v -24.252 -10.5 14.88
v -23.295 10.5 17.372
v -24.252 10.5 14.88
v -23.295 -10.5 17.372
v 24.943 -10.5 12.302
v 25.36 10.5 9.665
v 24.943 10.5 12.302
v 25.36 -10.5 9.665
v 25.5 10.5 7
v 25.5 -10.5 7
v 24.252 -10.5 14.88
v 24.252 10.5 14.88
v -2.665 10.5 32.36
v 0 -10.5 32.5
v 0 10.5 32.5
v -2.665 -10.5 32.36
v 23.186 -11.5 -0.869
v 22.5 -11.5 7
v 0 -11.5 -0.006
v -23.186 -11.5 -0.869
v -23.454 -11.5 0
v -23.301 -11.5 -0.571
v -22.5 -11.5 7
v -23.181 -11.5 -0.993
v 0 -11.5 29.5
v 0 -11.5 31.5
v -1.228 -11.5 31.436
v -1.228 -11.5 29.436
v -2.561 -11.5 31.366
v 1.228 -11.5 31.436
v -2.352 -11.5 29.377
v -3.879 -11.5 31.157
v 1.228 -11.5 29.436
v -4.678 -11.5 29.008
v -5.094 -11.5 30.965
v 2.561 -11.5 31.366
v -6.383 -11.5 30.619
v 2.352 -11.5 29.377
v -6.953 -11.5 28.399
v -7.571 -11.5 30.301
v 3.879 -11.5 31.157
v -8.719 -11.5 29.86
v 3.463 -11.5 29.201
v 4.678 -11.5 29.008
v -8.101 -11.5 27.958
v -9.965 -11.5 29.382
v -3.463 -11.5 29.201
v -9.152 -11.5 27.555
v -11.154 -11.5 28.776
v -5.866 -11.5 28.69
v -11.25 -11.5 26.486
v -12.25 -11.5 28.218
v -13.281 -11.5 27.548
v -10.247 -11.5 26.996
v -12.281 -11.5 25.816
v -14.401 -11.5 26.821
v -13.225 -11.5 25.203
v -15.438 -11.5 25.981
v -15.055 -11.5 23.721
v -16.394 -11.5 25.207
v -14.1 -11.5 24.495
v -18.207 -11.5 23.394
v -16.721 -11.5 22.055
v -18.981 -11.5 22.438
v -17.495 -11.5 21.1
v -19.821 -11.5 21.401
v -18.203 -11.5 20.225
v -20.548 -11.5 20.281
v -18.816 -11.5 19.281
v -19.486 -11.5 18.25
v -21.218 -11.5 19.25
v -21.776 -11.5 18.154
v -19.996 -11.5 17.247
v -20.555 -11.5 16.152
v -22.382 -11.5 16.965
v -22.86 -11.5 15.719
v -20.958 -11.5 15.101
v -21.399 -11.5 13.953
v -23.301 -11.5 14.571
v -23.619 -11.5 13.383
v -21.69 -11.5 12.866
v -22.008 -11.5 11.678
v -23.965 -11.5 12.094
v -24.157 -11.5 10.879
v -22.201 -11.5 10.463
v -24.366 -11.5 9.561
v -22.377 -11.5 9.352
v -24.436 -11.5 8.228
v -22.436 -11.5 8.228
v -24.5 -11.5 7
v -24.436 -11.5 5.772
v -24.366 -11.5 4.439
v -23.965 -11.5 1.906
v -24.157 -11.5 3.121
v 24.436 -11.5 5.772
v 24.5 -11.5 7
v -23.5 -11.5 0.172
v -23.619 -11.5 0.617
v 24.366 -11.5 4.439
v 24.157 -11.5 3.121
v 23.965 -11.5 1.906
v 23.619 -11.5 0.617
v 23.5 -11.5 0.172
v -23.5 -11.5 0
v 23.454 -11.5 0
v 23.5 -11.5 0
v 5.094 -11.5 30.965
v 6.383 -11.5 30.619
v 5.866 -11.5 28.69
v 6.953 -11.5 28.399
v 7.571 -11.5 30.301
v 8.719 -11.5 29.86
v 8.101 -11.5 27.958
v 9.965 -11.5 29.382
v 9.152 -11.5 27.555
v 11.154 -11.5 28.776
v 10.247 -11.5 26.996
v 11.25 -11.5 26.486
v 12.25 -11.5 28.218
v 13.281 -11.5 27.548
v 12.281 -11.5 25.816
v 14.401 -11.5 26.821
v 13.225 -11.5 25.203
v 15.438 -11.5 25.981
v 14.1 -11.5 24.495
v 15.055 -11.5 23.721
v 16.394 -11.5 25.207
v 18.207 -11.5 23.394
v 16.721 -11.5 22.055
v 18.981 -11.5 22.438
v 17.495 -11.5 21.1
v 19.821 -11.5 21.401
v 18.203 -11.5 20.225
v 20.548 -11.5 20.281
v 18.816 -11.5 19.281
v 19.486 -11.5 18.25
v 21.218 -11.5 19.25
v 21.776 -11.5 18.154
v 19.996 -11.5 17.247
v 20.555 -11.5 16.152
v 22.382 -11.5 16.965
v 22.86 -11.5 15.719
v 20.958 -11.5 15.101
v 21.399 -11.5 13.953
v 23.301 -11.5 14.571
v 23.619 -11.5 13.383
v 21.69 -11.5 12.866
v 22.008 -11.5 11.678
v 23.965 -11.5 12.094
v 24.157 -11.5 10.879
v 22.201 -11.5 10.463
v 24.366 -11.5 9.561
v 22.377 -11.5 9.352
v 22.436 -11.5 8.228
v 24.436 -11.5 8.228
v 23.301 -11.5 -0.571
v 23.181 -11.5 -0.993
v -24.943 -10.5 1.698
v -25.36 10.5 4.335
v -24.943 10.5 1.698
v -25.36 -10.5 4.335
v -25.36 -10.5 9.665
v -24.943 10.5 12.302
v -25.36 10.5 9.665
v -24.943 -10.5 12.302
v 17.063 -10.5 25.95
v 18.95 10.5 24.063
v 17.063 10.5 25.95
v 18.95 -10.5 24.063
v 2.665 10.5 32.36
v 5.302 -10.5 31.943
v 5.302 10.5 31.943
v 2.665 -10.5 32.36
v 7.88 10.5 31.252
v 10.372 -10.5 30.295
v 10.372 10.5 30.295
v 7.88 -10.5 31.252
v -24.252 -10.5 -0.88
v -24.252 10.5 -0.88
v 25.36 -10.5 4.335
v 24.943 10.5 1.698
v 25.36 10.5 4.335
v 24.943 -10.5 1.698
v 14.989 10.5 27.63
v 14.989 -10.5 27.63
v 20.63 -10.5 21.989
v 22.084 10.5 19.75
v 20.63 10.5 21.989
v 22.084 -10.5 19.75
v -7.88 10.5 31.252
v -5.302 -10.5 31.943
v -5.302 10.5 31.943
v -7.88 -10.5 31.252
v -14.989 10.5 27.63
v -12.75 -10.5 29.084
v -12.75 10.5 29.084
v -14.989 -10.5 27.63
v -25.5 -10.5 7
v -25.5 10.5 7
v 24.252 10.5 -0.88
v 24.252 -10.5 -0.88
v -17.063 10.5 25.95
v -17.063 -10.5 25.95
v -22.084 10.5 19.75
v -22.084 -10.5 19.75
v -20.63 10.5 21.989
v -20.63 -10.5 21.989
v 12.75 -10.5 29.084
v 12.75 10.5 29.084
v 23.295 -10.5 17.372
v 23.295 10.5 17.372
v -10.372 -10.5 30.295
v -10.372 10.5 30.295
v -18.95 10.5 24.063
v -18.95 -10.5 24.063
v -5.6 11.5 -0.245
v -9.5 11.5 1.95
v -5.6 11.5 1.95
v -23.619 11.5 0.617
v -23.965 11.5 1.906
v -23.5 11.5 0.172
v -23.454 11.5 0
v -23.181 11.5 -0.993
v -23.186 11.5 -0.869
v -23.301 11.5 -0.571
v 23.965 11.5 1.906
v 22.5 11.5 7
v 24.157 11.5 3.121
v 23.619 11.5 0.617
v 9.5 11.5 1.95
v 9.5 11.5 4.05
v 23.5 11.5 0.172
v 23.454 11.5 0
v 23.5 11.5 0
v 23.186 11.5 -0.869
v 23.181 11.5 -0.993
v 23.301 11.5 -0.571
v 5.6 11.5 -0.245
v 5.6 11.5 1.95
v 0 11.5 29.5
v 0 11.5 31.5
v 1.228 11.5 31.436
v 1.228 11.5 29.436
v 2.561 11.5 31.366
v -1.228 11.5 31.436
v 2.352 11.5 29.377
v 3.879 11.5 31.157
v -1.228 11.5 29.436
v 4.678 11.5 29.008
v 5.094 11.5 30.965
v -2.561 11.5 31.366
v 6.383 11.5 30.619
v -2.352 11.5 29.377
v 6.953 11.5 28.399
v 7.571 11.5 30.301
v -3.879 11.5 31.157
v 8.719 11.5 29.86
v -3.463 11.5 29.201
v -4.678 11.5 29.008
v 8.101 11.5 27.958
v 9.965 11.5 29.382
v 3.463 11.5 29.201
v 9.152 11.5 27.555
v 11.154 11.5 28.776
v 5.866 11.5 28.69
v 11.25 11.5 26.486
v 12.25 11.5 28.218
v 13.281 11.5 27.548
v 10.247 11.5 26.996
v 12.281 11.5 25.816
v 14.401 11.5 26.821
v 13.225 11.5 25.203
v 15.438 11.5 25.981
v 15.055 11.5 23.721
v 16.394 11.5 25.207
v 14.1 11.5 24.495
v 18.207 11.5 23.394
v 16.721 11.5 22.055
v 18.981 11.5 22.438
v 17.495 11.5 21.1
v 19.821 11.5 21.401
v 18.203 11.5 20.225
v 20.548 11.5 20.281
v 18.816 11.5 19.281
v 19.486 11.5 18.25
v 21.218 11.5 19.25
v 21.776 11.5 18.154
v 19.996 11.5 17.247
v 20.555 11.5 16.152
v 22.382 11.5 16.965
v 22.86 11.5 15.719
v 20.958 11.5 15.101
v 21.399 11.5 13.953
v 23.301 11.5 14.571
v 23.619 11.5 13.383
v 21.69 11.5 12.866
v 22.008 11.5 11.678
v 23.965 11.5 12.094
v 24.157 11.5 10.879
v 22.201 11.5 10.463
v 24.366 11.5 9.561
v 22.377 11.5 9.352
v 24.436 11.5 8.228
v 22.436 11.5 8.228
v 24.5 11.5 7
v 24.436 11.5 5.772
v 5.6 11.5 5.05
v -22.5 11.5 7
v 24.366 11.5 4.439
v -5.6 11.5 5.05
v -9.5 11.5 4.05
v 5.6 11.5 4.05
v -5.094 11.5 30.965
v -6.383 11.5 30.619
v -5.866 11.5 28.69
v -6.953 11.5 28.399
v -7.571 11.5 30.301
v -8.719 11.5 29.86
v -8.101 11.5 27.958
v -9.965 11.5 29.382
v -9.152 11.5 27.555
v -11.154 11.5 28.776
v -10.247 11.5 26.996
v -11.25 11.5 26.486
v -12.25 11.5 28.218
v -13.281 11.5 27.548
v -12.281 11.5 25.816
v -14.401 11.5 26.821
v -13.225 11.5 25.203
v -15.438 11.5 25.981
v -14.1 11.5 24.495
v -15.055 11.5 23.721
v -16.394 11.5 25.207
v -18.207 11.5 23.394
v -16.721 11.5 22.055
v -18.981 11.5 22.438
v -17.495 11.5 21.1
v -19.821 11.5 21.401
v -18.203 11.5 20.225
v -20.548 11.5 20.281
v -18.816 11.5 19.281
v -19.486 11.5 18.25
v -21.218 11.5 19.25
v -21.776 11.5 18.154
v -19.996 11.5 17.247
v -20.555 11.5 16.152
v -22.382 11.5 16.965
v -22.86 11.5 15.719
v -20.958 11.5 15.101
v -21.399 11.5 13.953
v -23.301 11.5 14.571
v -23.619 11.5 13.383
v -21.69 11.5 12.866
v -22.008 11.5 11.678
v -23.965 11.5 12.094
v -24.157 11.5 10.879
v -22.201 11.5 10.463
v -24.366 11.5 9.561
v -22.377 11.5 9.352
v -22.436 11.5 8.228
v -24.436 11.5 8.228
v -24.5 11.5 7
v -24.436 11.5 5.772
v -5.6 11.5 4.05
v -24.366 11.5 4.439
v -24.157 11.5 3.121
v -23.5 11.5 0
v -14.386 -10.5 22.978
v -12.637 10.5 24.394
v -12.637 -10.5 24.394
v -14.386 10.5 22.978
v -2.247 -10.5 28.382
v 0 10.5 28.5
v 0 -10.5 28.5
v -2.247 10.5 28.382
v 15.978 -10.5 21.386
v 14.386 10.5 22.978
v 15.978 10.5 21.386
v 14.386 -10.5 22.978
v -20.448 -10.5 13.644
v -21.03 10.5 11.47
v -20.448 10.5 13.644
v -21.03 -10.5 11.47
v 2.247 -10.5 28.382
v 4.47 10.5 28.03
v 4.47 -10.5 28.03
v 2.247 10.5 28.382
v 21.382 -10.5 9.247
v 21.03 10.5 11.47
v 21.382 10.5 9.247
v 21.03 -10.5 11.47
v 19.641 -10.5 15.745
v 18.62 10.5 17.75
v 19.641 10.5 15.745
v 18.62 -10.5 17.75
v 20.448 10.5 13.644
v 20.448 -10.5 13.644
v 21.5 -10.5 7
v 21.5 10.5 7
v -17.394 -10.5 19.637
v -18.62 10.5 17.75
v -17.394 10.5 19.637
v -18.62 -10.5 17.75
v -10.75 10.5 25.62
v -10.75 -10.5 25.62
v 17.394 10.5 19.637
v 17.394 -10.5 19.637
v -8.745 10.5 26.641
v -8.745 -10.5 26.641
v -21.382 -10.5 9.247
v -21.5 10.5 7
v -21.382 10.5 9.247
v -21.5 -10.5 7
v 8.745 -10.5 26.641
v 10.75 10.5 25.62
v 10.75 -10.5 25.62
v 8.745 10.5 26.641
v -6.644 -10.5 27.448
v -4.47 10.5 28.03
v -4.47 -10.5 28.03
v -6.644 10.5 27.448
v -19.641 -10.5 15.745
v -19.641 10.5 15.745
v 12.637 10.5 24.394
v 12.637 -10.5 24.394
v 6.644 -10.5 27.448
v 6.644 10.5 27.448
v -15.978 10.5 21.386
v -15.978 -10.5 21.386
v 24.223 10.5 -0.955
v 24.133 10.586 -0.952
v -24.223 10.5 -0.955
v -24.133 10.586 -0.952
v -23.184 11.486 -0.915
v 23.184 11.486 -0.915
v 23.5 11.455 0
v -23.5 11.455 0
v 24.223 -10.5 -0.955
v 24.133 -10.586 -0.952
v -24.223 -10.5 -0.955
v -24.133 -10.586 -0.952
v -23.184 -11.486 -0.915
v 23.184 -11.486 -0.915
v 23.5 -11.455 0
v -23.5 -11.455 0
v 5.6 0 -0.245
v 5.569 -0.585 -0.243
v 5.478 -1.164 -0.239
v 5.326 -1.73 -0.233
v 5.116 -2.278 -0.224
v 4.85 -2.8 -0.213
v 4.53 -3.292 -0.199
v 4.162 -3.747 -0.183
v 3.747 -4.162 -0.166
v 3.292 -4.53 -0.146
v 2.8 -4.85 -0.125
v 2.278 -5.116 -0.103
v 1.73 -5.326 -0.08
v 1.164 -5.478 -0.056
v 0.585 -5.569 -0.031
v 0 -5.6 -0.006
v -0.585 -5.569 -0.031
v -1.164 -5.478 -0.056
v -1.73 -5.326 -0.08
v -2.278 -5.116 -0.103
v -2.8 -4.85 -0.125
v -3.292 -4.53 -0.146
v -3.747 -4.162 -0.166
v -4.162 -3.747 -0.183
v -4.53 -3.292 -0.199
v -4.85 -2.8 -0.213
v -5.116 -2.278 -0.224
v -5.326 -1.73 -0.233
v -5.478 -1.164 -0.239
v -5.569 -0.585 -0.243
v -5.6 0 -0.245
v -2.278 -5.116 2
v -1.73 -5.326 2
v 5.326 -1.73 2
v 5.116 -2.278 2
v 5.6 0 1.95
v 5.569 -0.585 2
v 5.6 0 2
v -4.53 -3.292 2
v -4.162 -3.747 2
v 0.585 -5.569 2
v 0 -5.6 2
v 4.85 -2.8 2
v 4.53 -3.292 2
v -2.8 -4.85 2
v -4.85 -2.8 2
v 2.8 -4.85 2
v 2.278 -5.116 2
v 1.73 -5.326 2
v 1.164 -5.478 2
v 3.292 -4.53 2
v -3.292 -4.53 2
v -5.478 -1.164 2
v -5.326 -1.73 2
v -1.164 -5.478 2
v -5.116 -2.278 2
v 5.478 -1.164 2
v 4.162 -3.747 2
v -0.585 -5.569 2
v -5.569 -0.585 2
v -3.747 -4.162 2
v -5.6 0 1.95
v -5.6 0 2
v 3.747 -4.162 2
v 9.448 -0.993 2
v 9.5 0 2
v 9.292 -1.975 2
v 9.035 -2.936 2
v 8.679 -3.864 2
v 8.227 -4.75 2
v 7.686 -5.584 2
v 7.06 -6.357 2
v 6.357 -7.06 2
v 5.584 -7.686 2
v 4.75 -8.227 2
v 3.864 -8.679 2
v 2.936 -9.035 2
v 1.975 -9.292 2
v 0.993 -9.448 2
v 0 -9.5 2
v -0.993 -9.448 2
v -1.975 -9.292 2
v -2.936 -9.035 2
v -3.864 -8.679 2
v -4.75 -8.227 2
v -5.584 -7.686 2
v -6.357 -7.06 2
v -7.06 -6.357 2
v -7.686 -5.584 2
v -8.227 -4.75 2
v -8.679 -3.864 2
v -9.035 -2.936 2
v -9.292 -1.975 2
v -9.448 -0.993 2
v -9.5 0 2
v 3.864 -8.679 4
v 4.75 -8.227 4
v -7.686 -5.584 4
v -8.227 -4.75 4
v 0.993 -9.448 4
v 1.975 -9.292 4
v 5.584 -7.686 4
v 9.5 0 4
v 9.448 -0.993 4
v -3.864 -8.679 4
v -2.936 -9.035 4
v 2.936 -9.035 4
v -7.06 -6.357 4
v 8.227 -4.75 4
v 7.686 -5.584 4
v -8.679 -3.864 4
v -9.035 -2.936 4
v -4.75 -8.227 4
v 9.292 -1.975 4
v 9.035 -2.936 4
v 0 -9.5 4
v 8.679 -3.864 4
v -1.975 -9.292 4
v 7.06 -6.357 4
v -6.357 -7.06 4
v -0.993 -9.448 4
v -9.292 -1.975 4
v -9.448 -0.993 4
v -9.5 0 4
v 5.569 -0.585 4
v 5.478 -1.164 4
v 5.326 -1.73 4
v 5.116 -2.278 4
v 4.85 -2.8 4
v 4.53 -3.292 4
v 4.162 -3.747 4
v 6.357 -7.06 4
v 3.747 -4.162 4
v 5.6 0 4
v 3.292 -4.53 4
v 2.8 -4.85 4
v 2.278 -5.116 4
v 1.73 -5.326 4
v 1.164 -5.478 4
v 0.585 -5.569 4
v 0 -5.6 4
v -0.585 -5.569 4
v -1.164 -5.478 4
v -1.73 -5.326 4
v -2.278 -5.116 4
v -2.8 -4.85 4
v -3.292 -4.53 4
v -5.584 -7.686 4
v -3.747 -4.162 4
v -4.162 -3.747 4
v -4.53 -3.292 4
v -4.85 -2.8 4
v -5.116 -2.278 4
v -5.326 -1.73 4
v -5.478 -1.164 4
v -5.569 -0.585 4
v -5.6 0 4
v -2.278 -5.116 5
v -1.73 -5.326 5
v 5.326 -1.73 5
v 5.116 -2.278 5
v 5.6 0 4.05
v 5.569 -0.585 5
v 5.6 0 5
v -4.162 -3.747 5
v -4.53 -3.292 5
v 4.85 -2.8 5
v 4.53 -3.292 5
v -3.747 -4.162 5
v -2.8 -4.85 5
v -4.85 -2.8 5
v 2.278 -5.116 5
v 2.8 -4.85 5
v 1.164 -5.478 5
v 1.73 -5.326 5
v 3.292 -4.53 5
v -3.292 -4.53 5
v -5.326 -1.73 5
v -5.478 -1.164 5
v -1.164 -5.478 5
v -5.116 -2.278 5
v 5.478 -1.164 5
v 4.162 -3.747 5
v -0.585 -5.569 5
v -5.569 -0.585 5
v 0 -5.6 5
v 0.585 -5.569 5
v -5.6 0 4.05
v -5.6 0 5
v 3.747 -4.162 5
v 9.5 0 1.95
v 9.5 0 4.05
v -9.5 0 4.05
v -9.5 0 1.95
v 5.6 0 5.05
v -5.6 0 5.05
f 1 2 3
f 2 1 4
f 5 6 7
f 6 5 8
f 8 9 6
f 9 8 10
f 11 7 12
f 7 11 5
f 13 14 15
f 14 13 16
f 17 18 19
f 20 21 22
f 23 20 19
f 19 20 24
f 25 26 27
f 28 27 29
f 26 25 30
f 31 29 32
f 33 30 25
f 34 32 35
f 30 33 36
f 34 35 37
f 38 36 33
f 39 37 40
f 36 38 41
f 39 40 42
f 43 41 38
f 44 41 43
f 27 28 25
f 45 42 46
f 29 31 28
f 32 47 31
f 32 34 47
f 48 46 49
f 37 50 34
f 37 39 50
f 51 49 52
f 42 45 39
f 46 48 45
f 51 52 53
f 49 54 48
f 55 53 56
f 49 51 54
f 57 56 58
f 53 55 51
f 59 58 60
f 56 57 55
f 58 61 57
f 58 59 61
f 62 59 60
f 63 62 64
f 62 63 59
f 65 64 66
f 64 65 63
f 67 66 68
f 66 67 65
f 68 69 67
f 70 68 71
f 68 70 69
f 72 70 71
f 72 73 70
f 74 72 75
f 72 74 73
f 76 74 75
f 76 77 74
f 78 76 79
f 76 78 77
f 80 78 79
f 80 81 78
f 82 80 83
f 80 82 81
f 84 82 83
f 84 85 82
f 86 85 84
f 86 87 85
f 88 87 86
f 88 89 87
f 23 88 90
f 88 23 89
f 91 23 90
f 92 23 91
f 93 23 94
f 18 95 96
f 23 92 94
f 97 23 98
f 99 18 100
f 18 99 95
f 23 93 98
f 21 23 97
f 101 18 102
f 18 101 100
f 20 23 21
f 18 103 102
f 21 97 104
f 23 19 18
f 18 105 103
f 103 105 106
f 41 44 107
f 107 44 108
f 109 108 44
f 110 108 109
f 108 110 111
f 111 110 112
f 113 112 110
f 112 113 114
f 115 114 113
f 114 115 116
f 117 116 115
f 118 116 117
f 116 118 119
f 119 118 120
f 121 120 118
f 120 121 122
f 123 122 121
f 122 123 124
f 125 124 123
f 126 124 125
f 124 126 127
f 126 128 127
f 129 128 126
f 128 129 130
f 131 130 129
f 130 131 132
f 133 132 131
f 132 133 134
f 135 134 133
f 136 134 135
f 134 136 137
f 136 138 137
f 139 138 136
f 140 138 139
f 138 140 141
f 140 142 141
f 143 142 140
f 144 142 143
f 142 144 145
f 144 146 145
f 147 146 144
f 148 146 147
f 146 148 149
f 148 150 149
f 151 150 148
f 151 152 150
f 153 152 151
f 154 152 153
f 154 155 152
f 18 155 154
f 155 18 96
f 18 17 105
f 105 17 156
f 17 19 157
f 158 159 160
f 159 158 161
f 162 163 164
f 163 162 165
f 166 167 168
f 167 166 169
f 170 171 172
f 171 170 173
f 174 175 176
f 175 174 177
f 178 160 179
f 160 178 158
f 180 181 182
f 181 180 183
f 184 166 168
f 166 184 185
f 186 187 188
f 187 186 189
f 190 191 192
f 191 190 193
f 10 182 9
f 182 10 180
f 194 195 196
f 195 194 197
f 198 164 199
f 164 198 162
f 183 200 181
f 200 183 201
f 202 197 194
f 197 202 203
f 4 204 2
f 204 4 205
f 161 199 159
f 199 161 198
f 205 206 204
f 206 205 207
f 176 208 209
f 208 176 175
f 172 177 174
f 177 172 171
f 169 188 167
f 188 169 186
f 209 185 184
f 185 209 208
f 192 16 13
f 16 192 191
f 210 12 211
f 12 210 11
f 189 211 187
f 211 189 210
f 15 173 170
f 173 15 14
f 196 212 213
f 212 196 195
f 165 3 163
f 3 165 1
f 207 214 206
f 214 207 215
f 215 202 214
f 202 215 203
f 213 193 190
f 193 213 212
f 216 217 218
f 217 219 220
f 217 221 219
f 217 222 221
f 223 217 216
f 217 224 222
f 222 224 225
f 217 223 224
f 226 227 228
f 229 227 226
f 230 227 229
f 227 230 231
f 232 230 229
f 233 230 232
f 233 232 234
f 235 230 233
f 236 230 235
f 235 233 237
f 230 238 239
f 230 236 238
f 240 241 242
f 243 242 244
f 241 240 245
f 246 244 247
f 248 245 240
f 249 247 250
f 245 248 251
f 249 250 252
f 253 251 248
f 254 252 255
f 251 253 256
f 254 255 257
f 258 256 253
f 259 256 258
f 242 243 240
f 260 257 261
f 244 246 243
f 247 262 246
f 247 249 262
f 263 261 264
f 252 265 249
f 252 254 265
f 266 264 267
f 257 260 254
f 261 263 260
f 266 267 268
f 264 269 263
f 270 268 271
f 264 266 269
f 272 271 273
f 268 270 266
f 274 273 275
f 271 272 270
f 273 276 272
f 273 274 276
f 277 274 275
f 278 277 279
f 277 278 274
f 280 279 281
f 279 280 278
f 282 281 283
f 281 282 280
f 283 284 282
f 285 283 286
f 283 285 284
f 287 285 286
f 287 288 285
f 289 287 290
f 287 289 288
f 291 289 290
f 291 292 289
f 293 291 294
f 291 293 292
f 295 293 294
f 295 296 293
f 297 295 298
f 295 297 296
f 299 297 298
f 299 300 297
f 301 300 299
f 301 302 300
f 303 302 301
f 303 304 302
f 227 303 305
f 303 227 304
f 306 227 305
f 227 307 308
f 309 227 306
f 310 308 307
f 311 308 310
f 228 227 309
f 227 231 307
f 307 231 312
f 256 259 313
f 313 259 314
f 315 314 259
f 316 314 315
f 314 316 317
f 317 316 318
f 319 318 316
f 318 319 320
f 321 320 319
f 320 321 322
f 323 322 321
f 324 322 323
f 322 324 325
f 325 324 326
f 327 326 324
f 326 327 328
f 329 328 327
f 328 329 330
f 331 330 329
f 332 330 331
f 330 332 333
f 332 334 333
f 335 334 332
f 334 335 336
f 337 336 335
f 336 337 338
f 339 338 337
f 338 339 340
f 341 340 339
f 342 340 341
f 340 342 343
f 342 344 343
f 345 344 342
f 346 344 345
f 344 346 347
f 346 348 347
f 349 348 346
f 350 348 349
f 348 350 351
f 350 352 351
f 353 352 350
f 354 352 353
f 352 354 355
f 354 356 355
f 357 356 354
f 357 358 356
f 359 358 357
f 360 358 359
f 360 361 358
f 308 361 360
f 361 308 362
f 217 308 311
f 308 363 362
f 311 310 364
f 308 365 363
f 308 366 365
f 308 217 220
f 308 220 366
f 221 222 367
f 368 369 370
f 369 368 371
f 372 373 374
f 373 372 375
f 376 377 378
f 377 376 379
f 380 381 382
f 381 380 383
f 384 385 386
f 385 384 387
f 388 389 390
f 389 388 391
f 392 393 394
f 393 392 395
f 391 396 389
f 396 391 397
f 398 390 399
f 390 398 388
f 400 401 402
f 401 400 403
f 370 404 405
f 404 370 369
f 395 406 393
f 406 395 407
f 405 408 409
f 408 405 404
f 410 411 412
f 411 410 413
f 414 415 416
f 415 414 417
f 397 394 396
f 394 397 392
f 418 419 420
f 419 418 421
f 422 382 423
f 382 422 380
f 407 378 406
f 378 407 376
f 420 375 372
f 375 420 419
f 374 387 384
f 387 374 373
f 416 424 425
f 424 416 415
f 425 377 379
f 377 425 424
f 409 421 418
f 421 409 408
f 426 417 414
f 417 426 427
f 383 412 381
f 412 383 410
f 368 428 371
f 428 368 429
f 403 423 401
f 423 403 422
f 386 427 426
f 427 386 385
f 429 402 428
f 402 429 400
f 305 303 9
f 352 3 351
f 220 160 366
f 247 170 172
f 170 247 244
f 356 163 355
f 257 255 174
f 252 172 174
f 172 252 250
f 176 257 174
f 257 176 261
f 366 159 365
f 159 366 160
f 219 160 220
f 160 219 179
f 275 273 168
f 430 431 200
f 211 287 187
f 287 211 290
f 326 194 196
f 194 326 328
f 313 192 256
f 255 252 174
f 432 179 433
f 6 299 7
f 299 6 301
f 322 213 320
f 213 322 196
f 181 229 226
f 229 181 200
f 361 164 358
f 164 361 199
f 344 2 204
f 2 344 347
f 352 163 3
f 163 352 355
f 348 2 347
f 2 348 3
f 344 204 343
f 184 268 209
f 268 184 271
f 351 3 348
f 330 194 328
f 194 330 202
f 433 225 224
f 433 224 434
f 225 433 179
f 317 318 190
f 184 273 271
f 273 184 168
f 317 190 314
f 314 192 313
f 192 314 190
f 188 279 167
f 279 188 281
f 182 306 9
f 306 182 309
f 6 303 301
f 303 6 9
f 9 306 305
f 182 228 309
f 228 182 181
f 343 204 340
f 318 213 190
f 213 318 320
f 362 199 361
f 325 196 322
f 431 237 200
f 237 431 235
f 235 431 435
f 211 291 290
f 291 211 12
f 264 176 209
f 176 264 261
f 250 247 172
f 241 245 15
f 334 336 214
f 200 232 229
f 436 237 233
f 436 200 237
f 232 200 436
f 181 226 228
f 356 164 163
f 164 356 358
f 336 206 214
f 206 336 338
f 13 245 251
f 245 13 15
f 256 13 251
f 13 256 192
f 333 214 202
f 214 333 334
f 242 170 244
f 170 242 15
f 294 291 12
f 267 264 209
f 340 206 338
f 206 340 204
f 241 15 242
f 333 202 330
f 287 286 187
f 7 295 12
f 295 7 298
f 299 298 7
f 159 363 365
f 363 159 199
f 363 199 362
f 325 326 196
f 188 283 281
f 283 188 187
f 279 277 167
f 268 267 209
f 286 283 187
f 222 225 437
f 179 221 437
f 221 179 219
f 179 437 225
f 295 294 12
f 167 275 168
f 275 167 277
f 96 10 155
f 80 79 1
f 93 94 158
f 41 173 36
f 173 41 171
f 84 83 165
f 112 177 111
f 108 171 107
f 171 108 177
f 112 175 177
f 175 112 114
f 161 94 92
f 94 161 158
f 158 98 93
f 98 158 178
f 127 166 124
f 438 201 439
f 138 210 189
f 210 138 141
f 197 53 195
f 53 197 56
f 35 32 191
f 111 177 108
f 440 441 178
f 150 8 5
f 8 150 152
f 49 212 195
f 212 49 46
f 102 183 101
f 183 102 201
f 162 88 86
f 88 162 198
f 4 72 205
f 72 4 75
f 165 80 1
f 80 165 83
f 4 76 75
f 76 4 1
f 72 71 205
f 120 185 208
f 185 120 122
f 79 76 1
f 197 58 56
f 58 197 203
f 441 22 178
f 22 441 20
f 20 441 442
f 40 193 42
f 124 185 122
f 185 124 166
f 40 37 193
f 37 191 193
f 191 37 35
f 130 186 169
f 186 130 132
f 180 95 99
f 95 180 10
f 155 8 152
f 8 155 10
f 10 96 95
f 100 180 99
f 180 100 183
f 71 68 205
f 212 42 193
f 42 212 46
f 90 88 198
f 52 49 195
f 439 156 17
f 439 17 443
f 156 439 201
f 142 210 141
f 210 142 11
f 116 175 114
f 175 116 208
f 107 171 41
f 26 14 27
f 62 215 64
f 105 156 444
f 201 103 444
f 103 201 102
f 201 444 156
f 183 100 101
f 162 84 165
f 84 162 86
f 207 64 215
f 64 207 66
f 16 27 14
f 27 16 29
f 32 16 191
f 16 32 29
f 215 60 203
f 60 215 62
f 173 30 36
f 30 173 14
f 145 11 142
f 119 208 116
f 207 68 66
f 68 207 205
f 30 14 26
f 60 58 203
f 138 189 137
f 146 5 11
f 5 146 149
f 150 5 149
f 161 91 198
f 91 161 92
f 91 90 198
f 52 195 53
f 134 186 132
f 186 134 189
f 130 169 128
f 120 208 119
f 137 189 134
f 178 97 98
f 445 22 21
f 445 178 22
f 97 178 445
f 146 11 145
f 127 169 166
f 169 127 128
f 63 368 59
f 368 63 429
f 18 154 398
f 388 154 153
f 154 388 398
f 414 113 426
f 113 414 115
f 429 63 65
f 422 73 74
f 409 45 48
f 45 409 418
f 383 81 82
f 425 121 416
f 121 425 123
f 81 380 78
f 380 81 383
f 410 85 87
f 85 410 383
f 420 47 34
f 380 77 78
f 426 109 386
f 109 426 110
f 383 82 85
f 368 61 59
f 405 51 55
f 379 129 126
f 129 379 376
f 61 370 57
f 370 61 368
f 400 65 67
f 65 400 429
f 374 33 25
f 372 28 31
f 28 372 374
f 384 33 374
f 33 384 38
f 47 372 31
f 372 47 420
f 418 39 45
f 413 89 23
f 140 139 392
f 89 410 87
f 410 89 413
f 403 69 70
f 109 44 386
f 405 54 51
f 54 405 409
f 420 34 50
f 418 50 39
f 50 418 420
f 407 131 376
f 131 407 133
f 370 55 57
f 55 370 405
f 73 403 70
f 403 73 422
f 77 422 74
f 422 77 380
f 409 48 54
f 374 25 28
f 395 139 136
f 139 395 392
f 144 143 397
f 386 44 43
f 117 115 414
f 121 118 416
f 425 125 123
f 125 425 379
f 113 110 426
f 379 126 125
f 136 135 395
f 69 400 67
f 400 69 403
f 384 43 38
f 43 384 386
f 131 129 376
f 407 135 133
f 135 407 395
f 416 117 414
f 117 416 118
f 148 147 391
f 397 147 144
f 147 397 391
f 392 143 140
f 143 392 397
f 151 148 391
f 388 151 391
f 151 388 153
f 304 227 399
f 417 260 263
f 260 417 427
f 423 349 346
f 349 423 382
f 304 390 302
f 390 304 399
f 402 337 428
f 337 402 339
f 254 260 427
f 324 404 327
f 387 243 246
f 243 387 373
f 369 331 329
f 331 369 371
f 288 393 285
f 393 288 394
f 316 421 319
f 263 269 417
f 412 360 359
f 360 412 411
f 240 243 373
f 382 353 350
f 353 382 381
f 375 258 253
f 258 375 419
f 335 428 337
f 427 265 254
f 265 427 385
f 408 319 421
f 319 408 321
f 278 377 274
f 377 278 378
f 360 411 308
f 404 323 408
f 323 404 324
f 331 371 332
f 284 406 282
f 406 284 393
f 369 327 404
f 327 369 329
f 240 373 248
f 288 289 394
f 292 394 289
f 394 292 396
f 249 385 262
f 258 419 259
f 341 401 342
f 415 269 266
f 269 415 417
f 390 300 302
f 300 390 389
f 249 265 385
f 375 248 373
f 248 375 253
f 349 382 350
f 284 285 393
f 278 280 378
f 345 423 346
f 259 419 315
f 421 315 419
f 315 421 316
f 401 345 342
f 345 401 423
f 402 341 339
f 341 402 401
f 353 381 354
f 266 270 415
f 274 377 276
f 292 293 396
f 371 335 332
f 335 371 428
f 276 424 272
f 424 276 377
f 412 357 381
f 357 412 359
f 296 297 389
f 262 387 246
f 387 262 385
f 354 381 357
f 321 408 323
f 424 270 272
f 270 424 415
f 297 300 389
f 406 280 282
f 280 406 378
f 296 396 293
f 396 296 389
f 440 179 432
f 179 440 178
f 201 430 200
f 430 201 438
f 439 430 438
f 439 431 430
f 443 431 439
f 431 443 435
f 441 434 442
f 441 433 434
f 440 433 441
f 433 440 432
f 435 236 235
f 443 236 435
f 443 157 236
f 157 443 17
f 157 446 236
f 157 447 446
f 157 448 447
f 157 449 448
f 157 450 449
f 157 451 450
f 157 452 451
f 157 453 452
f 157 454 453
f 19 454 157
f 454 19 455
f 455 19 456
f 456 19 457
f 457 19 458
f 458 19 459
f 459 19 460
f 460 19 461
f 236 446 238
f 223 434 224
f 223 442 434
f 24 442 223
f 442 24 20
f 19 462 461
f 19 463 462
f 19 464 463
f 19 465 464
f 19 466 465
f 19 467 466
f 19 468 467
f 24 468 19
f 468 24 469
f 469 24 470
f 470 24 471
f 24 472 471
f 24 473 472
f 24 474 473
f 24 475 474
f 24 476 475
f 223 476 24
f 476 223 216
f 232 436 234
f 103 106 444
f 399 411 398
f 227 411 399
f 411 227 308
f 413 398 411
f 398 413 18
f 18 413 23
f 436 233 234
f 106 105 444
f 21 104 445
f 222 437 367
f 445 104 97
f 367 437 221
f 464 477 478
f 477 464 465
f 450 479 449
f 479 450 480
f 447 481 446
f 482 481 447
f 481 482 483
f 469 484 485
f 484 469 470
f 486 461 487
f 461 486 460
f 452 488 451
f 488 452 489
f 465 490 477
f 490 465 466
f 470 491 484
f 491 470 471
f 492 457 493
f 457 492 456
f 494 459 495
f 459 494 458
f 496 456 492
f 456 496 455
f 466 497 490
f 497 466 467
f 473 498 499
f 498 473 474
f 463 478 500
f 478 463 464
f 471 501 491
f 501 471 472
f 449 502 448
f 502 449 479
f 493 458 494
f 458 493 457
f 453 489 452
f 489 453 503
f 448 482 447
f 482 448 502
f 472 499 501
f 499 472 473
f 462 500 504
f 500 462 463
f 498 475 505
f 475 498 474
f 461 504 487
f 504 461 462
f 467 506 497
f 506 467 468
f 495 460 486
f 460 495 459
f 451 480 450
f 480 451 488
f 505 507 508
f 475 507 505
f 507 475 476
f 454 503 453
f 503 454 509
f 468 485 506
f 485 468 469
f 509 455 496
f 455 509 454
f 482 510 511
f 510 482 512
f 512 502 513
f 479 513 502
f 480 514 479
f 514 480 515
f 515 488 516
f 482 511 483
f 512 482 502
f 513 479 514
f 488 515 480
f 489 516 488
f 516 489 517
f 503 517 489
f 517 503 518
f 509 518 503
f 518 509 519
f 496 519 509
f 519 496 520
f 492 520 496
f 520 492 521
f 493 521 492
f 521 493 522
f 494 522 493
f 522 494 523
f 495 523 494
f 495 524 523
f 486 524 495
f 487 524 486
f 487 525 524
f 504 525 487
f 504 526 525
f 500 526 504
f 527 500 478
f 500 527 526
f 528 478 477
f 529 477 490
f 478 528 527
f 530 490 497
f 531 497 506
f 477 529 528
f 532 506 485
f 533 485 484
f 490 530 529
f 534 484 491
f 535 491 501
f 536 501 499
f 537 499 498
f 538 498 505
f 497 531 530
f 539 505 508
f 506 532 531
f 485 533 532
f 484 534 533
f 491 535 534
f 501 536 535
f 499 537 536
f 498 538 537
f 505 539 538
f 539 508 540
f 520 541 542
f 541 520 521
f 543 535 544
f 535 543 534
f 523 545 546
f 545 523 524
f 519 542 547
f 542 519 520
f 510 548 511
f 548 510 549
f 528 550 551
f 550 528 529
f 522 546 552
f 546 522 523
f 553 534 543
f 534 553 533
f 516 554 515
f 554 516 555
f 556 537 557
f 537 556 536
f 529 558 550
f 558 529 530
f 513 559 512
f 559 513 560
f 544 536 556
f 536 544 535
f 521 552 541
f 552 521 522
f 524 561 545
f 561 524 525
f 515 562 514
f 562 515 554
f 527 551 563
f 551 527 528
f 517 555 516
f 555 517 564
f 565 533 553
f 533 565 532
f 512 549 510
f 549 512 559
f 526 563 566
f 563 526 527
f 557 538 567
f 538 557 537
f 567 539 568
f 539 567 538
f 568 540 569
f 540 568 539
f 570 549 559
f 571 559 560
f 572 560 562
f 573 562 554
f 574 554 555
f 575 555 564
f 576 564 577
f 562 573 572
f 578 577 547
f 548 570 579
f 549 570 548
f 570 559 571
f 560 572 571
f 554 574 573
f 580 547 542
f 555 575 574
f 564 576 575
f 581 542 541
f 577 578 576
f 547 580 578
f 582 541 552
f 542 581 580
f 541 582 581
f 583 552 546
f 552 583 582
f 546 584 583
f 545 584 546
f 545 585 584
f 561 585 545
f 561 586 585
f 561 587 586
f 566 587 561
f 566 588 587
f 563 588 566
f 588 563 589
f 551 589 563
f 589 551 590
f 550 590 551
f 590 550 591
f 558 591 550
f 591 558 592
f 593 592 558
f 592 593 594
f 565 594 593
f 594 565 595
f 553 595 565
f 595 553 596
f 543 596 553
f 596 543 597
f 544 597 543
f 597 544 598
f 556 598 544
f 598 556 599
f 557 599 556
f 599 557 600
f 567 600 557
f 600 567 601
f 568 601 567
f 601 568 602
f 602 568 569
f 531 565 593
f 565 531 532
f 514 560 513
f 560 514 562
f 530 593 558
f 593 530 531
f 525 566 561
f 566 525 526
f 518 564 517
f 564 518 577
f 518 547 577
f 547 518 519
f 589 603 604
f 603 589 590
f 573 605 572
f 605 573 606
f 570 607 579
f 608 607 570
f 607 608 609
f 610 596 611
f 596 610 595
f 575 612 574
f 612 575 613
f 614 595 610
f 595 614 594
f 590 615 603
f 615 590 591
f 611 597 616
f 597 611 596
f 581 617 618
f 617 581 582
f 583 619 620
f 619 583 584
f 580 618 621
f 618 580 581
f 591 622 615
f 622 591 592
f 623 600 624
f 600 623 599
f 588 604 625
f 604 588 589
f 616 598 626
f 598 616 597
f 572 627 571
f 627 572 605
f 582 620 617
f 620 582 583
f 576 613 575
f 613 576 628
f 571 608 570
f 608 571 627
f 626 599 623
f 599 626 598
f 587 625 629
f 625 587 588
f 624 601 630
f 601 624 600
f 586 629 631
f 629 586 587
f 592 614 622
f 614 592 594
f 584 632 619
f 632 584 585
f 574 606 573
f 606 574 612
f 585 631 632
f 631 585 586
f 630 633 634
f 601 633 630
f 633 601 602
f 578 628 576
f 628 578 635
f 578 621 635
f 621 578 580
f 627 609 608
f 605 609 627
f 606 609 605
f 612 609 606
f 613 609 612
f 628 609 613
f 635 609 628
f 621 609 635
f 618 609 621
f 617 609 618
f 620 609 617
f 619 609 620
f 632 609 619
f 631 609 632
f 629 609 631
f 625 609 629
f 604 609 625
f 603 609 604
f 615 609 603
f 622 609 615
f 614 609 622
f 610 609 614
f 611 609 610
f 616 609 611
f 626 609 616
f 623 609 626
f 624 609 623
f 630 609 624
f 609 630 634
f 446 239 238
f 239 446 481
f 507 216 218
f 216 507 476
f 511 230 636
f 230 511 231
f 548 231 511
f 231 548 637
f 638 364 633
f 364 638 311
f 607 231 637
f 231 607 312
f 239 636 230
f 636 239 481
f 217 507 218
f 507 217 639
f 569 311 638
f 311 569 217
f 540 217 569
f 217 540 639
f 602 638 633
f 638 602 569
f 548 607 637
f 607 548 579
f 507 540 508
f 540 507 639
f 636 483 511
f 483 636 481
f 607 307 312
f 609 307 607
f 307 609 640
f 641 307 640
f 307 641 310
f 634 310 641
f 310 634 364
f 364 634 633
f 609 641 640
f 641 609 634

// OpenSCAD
//Handle Replacement for Nalgene Wide Mouth
//by Khairulmizam Samsudin, Sept 2016
//xource@gmail.com
//"nalgene_wide_mouth_handle" is licenced under Creative Commons :
//Attribution-NonCommercial-ShareAlike 4.0 International (CC BY-NC-SA 4.0)
//http://creativecommons.org/licenses/by-nc-sa/4.0/

//UPDATES:
//7/9/2016 - Released
//8/9/2016
//-Added a wedge to reduce gap between clip and cap
//-Added an option for a clip cover 
//-Customizable version

/* [Options] */
// preview[view:north east, tilt:side]
// Gap between clip and cap.   
Gap=1.0; // [0:4]
// Mount plate thickness
Mount_thickness=5; // [5:10]
// Generate cover for the handle clip? Advisable for permanent replacement
Cover=0; // [0:No,1:Yes]

/* [Hidden] */
$fn=60;
epsilon=0.1;
//cap
capD=57-1;//exclude ridges
capR=capD/2;
capH=16.7;
capD1=6.6+2.3*2;
capR1=capD1/2;
capH1=2;
capD2=19;
capR2=capD2/2;
capH2=2;
capD3=capD1;
capR3=capD3/2;
capH3=1;
//clip
tight=0;
clipgap=Gap;
clipcover=Cover;
cliptotalH=capH1+capH2+capH3;
clipH=cliptotalH+2;
clipL=capD-5;
clipW=capD2+4;
clipCH1=capH1;
clipCL1=capD1-tight;
clipCW1=capD2;
clipCZ1=clipCH1/2;
clipCH2=capH2;
clipCL2=capD2-tight;
clipCW2=capD2;
clipCZ2=clipCH1/2+clipCH2;
clipCH3=capH3;
clipCL3=capD3-tight;
clipCW3=capD2;
clipCZ3=clipCH1+clipCH2+clipCH3/2;

module cap(e=0,bottom=1) {
    if (bottom) {
        translate([0,0,-capH]) cylinder(r=capR,h=capH);
    }
    translate([0,0,-e/2]) cylinder(r=capR1+e,h=capH1+e);
    translate([0,0,capH1-e/2]) cylinder(r=capR2+e,h=capH2+e);
    translate([0,0,capH1+capH2-e/2]) cylinder(r=capR3+e,h=capH3+e);
}

module clip(L=clipL,e=epsilon) {
    difference() {
        translate([0,0,clipH/2]) union() {
            cube([L,clipW,clipH],center=true);
            translate([0,0,clipH/2]) rotate([90,0,0]) hgap(L=clipL-4);
        }
        cap(bottom=0);
        translate([0,0,-2]) cylinder(r=capR1,h=capH1+2);
        translate([0,clipCW1/2,clipCZ1]) cube([clipCL1,clipCW1,clipCH1+2+e],center=true);
        translate([0,clipCW2/2,clipCZ2]) cube([clipCL2,clipCW2,clipCH2+e],center=true);
        translate([0,clipCW3/2,clipCZ3]) cube([clipCL3,clipCW3,clipCH3+e],center=true);
        if (clipcover) {
            translate([0,clipcoverW/2+capD2/2,-(clipH-cliptotalH)/2-2/2]) clipcover(e=epsilon,H=cliptotalH+2);
        }
    }
}

module clipcover2() {
    difference() {
        translate([0,0,clipH/2]) cube([clipL-epsilon,clipW-epsilon,clipH-epsilon],center=true);
        union() {
            clip(e=0);
            cap(e=epsilon);
        }
    }
}
clipcoverW=(clipW-capD2)/2;
module clipcover(e=0,H=cliptotalH) {
    translate([0,epsilon/2,clipH/2]) cube([clipCW2,clipcoverW+epsilon,H],center=true);
}

handleD=clipL;
handleR=handleD/2;
handleH=clipW;
handleT=4;
module h1(gap=clipgap) {
difference() {
        cylinder(r=handleR,h=handleH,center=true);
        cylinder(r=handleR-handleT,h=handleH+epsilon,center=true);
        translate([0,-handleR-clipH-gap,0]) cube([handleD,handleD,handleH+epsilon],center=true);
    }
}

module hgap(L=clipL){
    rotate([0,0,atan(-clipgap*2/L)]) translate([0,-clipH,-clipW/2]) cube([L/2,clipgap,clipW]);
    mirror([1,0,0]) rotate([0,0,atan(-clipgap*2/L)]) translate([0,-clipH,-clipW/2]) cube([L/2,clipgap,clipW]);
}
module hgap1(intersect=1){
    difference() {
        intersection() {
            h1();   
            hgap();
        }
        hdull();
    }
}
module hdull() {
//dull the edge
     translate([0,0,handleH/2]) cylinder(r2=handleR-handleT+2,r1=handleR-handleT,h=2,center=true);
        mirror([0,0,1]) translate([0,0,handleH/2]) cylinder(r2=handleR-handleT+2,r1=handleR-handleT,h=2,center=true);
        translate([0,0,-handleH/2]) difference() {
            cylinder(r=handleR+epsilon,h=2,center=true);
            cylinder(r2=handleR,r1=handleR-2,h=2,center=true);
        }
        mirror([0,0,1]) translate([0,0,-handleH/2]) difference() {
            cylinder(r=handleR+epsilon,h=2,center=true);
            cylinder(r2=handleR,r1=handleR-2,h=2,center=true);
        }
}
module h2() {
    difference() { 
        h1(gap=clipgap/2);
        hdull();   
    }   
    hgap1();
    //difference() {
        //hgap(L=clipL-4);
        //rotate([]) cap(bottom=0);
    //}
    
}
module handle() {
    translate([0,0,clipH]) rotate([90,0,0]) h2();
    clip(L=clipL-4);
}

handle();
%cap();
if (clipcover) {
    translate([0,capD,0]) clipcover();
}
